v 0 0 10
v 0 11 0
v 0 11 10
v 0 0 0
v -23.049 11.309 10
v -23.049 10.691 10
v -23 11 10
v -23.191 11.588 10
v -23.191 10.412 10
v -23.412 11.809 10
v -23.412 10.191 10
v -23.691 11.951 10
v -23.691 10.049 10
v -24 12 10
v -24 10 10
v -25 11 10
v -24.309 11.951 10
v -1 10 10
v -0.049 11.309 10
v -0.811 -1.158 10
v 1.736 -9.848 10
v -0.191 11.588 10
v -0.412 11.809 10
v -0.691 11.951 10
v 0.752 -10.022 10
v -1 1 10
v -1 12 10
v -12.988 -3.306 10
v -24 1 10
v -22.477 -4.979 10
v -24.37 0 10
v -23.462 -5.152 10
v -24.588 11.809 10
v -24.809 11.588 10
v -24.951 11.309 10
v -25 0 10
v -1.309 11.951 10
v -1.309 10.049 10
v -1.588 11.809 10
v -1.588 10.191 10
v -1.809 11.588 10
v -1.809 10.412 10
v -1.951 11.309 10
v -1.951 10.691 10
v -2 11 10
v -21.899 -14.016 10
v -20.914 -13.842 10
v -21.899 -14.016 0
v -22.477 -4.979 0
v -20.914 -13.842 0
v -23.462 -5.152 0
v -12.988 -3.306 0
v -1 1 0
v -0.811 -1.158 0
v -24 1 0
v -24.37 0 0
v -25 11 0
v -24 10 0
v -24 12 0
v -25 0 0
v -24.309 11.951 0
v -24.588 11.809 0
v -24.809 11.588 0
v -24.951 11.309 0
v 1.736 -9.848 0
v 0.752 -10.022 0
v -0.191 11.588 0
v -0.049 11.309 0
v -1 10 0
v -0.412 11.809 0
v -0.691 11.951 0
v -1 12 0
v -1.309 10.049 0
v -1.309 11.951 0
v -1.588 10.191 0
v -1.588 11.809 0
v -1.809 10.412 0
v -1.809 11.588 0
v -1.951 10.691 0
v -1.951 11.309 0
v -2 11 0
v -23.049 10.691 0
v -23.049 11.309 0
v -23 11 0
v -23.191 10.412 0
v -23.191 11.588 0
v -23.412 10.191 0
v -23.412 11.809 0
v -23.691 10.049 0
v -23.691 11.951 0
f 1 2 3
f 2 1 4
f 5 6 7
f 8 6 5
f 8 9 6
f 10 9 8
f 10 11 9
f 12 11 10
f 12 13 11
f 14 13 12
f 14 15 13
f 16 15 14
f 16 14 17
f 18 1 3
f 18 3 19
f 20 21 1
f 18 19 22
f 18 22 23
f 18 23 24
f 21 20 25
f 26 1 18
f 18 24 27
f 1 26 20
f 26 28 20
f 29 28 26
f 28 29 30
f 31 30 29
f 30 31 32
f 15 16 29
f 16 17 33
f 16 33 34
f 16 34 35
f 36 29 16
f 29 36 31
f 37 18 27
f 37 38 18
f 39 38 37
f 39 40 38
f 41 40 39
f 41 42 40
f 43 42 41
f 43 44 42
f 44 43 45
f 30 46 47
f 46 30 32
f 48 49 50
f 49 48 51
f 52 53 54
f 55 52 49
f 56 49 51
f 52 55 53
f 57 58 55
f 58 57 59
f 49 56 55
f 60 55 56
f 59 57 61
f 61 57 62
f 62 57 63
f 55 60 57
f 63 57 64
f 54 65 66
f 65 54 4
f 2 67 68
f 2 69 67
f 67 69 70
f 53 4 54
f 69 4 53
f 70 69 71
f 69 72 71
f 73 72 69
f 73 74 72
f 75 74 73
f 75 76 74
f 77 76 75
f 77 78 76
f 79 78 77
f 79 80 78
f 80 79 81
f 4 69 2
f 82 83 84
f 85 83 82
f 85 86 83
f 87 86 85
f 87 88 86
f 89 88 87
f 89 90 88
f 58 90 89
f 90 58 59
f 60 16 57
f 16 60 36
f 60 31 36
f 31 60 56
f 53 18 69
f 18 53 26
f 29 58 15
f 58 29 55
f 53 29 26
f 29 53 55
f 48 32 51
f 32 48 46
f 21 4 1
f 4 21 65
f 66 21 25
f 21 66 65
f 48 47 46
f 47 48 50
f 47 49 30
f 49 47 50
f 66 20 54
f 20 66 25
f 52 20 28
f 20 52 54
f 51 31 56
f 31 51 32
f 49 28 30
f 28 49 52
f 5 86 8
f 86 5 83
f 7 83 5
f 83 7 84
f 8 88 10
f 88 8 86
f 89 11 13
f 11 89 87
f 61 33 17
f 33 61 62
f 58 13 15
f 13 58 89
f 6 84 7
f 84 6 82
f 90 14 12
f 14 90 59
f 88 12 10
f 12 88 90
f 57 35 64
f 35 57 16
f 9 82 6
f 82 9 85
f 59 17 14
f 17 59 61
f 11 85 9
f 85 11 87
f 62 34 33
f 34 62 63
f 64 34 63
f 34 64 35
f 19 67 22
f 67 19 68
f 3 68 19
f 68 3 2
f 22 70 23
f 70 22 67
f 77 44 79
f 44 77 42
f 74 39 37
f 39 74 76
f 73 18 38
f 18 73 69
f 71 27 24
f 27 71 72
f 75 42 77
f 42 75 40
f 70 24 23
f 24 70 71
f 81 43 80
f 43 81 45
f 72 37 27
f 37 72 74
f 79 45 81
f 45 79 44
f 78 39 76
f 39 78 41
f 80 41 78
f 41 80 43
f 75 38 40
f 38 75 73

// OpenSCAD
// Wii Sensor Bar Stand


// Angle of sensor
a = 10;

// Width of TV edge (mm)
w = 22;

// Depth of TV edge (mm)
d = 9;

/*[Hidden]*/
$fn=20;

// Wii sensor holder
difference(){
	translate([-25,0,0])cube([25,11,10]);
	translate([-24,1,-1]) cube([23,11,12]);
	}
	translate([-24,11,0]) cylinder(r=1,h=10);
	translate([-1,11,0]) cylinder(r=1,h=10);

// TV edge holder
difference(){
	rotate([0,0,180+a]) translate([0,0,0]) cube([w+2,d+1,10]);
	rotate([0,0,180+a]) translate([1,1,-1]) cube([w,d+1,12]);
	}

// Fill piece
intersection(){
	rotate([0,0,180+a]) translate([0,-2*d,0]) cube([w+2,2*d+1,10]);
	translate([-26,-30,0])cube([26,31,10]);
}
